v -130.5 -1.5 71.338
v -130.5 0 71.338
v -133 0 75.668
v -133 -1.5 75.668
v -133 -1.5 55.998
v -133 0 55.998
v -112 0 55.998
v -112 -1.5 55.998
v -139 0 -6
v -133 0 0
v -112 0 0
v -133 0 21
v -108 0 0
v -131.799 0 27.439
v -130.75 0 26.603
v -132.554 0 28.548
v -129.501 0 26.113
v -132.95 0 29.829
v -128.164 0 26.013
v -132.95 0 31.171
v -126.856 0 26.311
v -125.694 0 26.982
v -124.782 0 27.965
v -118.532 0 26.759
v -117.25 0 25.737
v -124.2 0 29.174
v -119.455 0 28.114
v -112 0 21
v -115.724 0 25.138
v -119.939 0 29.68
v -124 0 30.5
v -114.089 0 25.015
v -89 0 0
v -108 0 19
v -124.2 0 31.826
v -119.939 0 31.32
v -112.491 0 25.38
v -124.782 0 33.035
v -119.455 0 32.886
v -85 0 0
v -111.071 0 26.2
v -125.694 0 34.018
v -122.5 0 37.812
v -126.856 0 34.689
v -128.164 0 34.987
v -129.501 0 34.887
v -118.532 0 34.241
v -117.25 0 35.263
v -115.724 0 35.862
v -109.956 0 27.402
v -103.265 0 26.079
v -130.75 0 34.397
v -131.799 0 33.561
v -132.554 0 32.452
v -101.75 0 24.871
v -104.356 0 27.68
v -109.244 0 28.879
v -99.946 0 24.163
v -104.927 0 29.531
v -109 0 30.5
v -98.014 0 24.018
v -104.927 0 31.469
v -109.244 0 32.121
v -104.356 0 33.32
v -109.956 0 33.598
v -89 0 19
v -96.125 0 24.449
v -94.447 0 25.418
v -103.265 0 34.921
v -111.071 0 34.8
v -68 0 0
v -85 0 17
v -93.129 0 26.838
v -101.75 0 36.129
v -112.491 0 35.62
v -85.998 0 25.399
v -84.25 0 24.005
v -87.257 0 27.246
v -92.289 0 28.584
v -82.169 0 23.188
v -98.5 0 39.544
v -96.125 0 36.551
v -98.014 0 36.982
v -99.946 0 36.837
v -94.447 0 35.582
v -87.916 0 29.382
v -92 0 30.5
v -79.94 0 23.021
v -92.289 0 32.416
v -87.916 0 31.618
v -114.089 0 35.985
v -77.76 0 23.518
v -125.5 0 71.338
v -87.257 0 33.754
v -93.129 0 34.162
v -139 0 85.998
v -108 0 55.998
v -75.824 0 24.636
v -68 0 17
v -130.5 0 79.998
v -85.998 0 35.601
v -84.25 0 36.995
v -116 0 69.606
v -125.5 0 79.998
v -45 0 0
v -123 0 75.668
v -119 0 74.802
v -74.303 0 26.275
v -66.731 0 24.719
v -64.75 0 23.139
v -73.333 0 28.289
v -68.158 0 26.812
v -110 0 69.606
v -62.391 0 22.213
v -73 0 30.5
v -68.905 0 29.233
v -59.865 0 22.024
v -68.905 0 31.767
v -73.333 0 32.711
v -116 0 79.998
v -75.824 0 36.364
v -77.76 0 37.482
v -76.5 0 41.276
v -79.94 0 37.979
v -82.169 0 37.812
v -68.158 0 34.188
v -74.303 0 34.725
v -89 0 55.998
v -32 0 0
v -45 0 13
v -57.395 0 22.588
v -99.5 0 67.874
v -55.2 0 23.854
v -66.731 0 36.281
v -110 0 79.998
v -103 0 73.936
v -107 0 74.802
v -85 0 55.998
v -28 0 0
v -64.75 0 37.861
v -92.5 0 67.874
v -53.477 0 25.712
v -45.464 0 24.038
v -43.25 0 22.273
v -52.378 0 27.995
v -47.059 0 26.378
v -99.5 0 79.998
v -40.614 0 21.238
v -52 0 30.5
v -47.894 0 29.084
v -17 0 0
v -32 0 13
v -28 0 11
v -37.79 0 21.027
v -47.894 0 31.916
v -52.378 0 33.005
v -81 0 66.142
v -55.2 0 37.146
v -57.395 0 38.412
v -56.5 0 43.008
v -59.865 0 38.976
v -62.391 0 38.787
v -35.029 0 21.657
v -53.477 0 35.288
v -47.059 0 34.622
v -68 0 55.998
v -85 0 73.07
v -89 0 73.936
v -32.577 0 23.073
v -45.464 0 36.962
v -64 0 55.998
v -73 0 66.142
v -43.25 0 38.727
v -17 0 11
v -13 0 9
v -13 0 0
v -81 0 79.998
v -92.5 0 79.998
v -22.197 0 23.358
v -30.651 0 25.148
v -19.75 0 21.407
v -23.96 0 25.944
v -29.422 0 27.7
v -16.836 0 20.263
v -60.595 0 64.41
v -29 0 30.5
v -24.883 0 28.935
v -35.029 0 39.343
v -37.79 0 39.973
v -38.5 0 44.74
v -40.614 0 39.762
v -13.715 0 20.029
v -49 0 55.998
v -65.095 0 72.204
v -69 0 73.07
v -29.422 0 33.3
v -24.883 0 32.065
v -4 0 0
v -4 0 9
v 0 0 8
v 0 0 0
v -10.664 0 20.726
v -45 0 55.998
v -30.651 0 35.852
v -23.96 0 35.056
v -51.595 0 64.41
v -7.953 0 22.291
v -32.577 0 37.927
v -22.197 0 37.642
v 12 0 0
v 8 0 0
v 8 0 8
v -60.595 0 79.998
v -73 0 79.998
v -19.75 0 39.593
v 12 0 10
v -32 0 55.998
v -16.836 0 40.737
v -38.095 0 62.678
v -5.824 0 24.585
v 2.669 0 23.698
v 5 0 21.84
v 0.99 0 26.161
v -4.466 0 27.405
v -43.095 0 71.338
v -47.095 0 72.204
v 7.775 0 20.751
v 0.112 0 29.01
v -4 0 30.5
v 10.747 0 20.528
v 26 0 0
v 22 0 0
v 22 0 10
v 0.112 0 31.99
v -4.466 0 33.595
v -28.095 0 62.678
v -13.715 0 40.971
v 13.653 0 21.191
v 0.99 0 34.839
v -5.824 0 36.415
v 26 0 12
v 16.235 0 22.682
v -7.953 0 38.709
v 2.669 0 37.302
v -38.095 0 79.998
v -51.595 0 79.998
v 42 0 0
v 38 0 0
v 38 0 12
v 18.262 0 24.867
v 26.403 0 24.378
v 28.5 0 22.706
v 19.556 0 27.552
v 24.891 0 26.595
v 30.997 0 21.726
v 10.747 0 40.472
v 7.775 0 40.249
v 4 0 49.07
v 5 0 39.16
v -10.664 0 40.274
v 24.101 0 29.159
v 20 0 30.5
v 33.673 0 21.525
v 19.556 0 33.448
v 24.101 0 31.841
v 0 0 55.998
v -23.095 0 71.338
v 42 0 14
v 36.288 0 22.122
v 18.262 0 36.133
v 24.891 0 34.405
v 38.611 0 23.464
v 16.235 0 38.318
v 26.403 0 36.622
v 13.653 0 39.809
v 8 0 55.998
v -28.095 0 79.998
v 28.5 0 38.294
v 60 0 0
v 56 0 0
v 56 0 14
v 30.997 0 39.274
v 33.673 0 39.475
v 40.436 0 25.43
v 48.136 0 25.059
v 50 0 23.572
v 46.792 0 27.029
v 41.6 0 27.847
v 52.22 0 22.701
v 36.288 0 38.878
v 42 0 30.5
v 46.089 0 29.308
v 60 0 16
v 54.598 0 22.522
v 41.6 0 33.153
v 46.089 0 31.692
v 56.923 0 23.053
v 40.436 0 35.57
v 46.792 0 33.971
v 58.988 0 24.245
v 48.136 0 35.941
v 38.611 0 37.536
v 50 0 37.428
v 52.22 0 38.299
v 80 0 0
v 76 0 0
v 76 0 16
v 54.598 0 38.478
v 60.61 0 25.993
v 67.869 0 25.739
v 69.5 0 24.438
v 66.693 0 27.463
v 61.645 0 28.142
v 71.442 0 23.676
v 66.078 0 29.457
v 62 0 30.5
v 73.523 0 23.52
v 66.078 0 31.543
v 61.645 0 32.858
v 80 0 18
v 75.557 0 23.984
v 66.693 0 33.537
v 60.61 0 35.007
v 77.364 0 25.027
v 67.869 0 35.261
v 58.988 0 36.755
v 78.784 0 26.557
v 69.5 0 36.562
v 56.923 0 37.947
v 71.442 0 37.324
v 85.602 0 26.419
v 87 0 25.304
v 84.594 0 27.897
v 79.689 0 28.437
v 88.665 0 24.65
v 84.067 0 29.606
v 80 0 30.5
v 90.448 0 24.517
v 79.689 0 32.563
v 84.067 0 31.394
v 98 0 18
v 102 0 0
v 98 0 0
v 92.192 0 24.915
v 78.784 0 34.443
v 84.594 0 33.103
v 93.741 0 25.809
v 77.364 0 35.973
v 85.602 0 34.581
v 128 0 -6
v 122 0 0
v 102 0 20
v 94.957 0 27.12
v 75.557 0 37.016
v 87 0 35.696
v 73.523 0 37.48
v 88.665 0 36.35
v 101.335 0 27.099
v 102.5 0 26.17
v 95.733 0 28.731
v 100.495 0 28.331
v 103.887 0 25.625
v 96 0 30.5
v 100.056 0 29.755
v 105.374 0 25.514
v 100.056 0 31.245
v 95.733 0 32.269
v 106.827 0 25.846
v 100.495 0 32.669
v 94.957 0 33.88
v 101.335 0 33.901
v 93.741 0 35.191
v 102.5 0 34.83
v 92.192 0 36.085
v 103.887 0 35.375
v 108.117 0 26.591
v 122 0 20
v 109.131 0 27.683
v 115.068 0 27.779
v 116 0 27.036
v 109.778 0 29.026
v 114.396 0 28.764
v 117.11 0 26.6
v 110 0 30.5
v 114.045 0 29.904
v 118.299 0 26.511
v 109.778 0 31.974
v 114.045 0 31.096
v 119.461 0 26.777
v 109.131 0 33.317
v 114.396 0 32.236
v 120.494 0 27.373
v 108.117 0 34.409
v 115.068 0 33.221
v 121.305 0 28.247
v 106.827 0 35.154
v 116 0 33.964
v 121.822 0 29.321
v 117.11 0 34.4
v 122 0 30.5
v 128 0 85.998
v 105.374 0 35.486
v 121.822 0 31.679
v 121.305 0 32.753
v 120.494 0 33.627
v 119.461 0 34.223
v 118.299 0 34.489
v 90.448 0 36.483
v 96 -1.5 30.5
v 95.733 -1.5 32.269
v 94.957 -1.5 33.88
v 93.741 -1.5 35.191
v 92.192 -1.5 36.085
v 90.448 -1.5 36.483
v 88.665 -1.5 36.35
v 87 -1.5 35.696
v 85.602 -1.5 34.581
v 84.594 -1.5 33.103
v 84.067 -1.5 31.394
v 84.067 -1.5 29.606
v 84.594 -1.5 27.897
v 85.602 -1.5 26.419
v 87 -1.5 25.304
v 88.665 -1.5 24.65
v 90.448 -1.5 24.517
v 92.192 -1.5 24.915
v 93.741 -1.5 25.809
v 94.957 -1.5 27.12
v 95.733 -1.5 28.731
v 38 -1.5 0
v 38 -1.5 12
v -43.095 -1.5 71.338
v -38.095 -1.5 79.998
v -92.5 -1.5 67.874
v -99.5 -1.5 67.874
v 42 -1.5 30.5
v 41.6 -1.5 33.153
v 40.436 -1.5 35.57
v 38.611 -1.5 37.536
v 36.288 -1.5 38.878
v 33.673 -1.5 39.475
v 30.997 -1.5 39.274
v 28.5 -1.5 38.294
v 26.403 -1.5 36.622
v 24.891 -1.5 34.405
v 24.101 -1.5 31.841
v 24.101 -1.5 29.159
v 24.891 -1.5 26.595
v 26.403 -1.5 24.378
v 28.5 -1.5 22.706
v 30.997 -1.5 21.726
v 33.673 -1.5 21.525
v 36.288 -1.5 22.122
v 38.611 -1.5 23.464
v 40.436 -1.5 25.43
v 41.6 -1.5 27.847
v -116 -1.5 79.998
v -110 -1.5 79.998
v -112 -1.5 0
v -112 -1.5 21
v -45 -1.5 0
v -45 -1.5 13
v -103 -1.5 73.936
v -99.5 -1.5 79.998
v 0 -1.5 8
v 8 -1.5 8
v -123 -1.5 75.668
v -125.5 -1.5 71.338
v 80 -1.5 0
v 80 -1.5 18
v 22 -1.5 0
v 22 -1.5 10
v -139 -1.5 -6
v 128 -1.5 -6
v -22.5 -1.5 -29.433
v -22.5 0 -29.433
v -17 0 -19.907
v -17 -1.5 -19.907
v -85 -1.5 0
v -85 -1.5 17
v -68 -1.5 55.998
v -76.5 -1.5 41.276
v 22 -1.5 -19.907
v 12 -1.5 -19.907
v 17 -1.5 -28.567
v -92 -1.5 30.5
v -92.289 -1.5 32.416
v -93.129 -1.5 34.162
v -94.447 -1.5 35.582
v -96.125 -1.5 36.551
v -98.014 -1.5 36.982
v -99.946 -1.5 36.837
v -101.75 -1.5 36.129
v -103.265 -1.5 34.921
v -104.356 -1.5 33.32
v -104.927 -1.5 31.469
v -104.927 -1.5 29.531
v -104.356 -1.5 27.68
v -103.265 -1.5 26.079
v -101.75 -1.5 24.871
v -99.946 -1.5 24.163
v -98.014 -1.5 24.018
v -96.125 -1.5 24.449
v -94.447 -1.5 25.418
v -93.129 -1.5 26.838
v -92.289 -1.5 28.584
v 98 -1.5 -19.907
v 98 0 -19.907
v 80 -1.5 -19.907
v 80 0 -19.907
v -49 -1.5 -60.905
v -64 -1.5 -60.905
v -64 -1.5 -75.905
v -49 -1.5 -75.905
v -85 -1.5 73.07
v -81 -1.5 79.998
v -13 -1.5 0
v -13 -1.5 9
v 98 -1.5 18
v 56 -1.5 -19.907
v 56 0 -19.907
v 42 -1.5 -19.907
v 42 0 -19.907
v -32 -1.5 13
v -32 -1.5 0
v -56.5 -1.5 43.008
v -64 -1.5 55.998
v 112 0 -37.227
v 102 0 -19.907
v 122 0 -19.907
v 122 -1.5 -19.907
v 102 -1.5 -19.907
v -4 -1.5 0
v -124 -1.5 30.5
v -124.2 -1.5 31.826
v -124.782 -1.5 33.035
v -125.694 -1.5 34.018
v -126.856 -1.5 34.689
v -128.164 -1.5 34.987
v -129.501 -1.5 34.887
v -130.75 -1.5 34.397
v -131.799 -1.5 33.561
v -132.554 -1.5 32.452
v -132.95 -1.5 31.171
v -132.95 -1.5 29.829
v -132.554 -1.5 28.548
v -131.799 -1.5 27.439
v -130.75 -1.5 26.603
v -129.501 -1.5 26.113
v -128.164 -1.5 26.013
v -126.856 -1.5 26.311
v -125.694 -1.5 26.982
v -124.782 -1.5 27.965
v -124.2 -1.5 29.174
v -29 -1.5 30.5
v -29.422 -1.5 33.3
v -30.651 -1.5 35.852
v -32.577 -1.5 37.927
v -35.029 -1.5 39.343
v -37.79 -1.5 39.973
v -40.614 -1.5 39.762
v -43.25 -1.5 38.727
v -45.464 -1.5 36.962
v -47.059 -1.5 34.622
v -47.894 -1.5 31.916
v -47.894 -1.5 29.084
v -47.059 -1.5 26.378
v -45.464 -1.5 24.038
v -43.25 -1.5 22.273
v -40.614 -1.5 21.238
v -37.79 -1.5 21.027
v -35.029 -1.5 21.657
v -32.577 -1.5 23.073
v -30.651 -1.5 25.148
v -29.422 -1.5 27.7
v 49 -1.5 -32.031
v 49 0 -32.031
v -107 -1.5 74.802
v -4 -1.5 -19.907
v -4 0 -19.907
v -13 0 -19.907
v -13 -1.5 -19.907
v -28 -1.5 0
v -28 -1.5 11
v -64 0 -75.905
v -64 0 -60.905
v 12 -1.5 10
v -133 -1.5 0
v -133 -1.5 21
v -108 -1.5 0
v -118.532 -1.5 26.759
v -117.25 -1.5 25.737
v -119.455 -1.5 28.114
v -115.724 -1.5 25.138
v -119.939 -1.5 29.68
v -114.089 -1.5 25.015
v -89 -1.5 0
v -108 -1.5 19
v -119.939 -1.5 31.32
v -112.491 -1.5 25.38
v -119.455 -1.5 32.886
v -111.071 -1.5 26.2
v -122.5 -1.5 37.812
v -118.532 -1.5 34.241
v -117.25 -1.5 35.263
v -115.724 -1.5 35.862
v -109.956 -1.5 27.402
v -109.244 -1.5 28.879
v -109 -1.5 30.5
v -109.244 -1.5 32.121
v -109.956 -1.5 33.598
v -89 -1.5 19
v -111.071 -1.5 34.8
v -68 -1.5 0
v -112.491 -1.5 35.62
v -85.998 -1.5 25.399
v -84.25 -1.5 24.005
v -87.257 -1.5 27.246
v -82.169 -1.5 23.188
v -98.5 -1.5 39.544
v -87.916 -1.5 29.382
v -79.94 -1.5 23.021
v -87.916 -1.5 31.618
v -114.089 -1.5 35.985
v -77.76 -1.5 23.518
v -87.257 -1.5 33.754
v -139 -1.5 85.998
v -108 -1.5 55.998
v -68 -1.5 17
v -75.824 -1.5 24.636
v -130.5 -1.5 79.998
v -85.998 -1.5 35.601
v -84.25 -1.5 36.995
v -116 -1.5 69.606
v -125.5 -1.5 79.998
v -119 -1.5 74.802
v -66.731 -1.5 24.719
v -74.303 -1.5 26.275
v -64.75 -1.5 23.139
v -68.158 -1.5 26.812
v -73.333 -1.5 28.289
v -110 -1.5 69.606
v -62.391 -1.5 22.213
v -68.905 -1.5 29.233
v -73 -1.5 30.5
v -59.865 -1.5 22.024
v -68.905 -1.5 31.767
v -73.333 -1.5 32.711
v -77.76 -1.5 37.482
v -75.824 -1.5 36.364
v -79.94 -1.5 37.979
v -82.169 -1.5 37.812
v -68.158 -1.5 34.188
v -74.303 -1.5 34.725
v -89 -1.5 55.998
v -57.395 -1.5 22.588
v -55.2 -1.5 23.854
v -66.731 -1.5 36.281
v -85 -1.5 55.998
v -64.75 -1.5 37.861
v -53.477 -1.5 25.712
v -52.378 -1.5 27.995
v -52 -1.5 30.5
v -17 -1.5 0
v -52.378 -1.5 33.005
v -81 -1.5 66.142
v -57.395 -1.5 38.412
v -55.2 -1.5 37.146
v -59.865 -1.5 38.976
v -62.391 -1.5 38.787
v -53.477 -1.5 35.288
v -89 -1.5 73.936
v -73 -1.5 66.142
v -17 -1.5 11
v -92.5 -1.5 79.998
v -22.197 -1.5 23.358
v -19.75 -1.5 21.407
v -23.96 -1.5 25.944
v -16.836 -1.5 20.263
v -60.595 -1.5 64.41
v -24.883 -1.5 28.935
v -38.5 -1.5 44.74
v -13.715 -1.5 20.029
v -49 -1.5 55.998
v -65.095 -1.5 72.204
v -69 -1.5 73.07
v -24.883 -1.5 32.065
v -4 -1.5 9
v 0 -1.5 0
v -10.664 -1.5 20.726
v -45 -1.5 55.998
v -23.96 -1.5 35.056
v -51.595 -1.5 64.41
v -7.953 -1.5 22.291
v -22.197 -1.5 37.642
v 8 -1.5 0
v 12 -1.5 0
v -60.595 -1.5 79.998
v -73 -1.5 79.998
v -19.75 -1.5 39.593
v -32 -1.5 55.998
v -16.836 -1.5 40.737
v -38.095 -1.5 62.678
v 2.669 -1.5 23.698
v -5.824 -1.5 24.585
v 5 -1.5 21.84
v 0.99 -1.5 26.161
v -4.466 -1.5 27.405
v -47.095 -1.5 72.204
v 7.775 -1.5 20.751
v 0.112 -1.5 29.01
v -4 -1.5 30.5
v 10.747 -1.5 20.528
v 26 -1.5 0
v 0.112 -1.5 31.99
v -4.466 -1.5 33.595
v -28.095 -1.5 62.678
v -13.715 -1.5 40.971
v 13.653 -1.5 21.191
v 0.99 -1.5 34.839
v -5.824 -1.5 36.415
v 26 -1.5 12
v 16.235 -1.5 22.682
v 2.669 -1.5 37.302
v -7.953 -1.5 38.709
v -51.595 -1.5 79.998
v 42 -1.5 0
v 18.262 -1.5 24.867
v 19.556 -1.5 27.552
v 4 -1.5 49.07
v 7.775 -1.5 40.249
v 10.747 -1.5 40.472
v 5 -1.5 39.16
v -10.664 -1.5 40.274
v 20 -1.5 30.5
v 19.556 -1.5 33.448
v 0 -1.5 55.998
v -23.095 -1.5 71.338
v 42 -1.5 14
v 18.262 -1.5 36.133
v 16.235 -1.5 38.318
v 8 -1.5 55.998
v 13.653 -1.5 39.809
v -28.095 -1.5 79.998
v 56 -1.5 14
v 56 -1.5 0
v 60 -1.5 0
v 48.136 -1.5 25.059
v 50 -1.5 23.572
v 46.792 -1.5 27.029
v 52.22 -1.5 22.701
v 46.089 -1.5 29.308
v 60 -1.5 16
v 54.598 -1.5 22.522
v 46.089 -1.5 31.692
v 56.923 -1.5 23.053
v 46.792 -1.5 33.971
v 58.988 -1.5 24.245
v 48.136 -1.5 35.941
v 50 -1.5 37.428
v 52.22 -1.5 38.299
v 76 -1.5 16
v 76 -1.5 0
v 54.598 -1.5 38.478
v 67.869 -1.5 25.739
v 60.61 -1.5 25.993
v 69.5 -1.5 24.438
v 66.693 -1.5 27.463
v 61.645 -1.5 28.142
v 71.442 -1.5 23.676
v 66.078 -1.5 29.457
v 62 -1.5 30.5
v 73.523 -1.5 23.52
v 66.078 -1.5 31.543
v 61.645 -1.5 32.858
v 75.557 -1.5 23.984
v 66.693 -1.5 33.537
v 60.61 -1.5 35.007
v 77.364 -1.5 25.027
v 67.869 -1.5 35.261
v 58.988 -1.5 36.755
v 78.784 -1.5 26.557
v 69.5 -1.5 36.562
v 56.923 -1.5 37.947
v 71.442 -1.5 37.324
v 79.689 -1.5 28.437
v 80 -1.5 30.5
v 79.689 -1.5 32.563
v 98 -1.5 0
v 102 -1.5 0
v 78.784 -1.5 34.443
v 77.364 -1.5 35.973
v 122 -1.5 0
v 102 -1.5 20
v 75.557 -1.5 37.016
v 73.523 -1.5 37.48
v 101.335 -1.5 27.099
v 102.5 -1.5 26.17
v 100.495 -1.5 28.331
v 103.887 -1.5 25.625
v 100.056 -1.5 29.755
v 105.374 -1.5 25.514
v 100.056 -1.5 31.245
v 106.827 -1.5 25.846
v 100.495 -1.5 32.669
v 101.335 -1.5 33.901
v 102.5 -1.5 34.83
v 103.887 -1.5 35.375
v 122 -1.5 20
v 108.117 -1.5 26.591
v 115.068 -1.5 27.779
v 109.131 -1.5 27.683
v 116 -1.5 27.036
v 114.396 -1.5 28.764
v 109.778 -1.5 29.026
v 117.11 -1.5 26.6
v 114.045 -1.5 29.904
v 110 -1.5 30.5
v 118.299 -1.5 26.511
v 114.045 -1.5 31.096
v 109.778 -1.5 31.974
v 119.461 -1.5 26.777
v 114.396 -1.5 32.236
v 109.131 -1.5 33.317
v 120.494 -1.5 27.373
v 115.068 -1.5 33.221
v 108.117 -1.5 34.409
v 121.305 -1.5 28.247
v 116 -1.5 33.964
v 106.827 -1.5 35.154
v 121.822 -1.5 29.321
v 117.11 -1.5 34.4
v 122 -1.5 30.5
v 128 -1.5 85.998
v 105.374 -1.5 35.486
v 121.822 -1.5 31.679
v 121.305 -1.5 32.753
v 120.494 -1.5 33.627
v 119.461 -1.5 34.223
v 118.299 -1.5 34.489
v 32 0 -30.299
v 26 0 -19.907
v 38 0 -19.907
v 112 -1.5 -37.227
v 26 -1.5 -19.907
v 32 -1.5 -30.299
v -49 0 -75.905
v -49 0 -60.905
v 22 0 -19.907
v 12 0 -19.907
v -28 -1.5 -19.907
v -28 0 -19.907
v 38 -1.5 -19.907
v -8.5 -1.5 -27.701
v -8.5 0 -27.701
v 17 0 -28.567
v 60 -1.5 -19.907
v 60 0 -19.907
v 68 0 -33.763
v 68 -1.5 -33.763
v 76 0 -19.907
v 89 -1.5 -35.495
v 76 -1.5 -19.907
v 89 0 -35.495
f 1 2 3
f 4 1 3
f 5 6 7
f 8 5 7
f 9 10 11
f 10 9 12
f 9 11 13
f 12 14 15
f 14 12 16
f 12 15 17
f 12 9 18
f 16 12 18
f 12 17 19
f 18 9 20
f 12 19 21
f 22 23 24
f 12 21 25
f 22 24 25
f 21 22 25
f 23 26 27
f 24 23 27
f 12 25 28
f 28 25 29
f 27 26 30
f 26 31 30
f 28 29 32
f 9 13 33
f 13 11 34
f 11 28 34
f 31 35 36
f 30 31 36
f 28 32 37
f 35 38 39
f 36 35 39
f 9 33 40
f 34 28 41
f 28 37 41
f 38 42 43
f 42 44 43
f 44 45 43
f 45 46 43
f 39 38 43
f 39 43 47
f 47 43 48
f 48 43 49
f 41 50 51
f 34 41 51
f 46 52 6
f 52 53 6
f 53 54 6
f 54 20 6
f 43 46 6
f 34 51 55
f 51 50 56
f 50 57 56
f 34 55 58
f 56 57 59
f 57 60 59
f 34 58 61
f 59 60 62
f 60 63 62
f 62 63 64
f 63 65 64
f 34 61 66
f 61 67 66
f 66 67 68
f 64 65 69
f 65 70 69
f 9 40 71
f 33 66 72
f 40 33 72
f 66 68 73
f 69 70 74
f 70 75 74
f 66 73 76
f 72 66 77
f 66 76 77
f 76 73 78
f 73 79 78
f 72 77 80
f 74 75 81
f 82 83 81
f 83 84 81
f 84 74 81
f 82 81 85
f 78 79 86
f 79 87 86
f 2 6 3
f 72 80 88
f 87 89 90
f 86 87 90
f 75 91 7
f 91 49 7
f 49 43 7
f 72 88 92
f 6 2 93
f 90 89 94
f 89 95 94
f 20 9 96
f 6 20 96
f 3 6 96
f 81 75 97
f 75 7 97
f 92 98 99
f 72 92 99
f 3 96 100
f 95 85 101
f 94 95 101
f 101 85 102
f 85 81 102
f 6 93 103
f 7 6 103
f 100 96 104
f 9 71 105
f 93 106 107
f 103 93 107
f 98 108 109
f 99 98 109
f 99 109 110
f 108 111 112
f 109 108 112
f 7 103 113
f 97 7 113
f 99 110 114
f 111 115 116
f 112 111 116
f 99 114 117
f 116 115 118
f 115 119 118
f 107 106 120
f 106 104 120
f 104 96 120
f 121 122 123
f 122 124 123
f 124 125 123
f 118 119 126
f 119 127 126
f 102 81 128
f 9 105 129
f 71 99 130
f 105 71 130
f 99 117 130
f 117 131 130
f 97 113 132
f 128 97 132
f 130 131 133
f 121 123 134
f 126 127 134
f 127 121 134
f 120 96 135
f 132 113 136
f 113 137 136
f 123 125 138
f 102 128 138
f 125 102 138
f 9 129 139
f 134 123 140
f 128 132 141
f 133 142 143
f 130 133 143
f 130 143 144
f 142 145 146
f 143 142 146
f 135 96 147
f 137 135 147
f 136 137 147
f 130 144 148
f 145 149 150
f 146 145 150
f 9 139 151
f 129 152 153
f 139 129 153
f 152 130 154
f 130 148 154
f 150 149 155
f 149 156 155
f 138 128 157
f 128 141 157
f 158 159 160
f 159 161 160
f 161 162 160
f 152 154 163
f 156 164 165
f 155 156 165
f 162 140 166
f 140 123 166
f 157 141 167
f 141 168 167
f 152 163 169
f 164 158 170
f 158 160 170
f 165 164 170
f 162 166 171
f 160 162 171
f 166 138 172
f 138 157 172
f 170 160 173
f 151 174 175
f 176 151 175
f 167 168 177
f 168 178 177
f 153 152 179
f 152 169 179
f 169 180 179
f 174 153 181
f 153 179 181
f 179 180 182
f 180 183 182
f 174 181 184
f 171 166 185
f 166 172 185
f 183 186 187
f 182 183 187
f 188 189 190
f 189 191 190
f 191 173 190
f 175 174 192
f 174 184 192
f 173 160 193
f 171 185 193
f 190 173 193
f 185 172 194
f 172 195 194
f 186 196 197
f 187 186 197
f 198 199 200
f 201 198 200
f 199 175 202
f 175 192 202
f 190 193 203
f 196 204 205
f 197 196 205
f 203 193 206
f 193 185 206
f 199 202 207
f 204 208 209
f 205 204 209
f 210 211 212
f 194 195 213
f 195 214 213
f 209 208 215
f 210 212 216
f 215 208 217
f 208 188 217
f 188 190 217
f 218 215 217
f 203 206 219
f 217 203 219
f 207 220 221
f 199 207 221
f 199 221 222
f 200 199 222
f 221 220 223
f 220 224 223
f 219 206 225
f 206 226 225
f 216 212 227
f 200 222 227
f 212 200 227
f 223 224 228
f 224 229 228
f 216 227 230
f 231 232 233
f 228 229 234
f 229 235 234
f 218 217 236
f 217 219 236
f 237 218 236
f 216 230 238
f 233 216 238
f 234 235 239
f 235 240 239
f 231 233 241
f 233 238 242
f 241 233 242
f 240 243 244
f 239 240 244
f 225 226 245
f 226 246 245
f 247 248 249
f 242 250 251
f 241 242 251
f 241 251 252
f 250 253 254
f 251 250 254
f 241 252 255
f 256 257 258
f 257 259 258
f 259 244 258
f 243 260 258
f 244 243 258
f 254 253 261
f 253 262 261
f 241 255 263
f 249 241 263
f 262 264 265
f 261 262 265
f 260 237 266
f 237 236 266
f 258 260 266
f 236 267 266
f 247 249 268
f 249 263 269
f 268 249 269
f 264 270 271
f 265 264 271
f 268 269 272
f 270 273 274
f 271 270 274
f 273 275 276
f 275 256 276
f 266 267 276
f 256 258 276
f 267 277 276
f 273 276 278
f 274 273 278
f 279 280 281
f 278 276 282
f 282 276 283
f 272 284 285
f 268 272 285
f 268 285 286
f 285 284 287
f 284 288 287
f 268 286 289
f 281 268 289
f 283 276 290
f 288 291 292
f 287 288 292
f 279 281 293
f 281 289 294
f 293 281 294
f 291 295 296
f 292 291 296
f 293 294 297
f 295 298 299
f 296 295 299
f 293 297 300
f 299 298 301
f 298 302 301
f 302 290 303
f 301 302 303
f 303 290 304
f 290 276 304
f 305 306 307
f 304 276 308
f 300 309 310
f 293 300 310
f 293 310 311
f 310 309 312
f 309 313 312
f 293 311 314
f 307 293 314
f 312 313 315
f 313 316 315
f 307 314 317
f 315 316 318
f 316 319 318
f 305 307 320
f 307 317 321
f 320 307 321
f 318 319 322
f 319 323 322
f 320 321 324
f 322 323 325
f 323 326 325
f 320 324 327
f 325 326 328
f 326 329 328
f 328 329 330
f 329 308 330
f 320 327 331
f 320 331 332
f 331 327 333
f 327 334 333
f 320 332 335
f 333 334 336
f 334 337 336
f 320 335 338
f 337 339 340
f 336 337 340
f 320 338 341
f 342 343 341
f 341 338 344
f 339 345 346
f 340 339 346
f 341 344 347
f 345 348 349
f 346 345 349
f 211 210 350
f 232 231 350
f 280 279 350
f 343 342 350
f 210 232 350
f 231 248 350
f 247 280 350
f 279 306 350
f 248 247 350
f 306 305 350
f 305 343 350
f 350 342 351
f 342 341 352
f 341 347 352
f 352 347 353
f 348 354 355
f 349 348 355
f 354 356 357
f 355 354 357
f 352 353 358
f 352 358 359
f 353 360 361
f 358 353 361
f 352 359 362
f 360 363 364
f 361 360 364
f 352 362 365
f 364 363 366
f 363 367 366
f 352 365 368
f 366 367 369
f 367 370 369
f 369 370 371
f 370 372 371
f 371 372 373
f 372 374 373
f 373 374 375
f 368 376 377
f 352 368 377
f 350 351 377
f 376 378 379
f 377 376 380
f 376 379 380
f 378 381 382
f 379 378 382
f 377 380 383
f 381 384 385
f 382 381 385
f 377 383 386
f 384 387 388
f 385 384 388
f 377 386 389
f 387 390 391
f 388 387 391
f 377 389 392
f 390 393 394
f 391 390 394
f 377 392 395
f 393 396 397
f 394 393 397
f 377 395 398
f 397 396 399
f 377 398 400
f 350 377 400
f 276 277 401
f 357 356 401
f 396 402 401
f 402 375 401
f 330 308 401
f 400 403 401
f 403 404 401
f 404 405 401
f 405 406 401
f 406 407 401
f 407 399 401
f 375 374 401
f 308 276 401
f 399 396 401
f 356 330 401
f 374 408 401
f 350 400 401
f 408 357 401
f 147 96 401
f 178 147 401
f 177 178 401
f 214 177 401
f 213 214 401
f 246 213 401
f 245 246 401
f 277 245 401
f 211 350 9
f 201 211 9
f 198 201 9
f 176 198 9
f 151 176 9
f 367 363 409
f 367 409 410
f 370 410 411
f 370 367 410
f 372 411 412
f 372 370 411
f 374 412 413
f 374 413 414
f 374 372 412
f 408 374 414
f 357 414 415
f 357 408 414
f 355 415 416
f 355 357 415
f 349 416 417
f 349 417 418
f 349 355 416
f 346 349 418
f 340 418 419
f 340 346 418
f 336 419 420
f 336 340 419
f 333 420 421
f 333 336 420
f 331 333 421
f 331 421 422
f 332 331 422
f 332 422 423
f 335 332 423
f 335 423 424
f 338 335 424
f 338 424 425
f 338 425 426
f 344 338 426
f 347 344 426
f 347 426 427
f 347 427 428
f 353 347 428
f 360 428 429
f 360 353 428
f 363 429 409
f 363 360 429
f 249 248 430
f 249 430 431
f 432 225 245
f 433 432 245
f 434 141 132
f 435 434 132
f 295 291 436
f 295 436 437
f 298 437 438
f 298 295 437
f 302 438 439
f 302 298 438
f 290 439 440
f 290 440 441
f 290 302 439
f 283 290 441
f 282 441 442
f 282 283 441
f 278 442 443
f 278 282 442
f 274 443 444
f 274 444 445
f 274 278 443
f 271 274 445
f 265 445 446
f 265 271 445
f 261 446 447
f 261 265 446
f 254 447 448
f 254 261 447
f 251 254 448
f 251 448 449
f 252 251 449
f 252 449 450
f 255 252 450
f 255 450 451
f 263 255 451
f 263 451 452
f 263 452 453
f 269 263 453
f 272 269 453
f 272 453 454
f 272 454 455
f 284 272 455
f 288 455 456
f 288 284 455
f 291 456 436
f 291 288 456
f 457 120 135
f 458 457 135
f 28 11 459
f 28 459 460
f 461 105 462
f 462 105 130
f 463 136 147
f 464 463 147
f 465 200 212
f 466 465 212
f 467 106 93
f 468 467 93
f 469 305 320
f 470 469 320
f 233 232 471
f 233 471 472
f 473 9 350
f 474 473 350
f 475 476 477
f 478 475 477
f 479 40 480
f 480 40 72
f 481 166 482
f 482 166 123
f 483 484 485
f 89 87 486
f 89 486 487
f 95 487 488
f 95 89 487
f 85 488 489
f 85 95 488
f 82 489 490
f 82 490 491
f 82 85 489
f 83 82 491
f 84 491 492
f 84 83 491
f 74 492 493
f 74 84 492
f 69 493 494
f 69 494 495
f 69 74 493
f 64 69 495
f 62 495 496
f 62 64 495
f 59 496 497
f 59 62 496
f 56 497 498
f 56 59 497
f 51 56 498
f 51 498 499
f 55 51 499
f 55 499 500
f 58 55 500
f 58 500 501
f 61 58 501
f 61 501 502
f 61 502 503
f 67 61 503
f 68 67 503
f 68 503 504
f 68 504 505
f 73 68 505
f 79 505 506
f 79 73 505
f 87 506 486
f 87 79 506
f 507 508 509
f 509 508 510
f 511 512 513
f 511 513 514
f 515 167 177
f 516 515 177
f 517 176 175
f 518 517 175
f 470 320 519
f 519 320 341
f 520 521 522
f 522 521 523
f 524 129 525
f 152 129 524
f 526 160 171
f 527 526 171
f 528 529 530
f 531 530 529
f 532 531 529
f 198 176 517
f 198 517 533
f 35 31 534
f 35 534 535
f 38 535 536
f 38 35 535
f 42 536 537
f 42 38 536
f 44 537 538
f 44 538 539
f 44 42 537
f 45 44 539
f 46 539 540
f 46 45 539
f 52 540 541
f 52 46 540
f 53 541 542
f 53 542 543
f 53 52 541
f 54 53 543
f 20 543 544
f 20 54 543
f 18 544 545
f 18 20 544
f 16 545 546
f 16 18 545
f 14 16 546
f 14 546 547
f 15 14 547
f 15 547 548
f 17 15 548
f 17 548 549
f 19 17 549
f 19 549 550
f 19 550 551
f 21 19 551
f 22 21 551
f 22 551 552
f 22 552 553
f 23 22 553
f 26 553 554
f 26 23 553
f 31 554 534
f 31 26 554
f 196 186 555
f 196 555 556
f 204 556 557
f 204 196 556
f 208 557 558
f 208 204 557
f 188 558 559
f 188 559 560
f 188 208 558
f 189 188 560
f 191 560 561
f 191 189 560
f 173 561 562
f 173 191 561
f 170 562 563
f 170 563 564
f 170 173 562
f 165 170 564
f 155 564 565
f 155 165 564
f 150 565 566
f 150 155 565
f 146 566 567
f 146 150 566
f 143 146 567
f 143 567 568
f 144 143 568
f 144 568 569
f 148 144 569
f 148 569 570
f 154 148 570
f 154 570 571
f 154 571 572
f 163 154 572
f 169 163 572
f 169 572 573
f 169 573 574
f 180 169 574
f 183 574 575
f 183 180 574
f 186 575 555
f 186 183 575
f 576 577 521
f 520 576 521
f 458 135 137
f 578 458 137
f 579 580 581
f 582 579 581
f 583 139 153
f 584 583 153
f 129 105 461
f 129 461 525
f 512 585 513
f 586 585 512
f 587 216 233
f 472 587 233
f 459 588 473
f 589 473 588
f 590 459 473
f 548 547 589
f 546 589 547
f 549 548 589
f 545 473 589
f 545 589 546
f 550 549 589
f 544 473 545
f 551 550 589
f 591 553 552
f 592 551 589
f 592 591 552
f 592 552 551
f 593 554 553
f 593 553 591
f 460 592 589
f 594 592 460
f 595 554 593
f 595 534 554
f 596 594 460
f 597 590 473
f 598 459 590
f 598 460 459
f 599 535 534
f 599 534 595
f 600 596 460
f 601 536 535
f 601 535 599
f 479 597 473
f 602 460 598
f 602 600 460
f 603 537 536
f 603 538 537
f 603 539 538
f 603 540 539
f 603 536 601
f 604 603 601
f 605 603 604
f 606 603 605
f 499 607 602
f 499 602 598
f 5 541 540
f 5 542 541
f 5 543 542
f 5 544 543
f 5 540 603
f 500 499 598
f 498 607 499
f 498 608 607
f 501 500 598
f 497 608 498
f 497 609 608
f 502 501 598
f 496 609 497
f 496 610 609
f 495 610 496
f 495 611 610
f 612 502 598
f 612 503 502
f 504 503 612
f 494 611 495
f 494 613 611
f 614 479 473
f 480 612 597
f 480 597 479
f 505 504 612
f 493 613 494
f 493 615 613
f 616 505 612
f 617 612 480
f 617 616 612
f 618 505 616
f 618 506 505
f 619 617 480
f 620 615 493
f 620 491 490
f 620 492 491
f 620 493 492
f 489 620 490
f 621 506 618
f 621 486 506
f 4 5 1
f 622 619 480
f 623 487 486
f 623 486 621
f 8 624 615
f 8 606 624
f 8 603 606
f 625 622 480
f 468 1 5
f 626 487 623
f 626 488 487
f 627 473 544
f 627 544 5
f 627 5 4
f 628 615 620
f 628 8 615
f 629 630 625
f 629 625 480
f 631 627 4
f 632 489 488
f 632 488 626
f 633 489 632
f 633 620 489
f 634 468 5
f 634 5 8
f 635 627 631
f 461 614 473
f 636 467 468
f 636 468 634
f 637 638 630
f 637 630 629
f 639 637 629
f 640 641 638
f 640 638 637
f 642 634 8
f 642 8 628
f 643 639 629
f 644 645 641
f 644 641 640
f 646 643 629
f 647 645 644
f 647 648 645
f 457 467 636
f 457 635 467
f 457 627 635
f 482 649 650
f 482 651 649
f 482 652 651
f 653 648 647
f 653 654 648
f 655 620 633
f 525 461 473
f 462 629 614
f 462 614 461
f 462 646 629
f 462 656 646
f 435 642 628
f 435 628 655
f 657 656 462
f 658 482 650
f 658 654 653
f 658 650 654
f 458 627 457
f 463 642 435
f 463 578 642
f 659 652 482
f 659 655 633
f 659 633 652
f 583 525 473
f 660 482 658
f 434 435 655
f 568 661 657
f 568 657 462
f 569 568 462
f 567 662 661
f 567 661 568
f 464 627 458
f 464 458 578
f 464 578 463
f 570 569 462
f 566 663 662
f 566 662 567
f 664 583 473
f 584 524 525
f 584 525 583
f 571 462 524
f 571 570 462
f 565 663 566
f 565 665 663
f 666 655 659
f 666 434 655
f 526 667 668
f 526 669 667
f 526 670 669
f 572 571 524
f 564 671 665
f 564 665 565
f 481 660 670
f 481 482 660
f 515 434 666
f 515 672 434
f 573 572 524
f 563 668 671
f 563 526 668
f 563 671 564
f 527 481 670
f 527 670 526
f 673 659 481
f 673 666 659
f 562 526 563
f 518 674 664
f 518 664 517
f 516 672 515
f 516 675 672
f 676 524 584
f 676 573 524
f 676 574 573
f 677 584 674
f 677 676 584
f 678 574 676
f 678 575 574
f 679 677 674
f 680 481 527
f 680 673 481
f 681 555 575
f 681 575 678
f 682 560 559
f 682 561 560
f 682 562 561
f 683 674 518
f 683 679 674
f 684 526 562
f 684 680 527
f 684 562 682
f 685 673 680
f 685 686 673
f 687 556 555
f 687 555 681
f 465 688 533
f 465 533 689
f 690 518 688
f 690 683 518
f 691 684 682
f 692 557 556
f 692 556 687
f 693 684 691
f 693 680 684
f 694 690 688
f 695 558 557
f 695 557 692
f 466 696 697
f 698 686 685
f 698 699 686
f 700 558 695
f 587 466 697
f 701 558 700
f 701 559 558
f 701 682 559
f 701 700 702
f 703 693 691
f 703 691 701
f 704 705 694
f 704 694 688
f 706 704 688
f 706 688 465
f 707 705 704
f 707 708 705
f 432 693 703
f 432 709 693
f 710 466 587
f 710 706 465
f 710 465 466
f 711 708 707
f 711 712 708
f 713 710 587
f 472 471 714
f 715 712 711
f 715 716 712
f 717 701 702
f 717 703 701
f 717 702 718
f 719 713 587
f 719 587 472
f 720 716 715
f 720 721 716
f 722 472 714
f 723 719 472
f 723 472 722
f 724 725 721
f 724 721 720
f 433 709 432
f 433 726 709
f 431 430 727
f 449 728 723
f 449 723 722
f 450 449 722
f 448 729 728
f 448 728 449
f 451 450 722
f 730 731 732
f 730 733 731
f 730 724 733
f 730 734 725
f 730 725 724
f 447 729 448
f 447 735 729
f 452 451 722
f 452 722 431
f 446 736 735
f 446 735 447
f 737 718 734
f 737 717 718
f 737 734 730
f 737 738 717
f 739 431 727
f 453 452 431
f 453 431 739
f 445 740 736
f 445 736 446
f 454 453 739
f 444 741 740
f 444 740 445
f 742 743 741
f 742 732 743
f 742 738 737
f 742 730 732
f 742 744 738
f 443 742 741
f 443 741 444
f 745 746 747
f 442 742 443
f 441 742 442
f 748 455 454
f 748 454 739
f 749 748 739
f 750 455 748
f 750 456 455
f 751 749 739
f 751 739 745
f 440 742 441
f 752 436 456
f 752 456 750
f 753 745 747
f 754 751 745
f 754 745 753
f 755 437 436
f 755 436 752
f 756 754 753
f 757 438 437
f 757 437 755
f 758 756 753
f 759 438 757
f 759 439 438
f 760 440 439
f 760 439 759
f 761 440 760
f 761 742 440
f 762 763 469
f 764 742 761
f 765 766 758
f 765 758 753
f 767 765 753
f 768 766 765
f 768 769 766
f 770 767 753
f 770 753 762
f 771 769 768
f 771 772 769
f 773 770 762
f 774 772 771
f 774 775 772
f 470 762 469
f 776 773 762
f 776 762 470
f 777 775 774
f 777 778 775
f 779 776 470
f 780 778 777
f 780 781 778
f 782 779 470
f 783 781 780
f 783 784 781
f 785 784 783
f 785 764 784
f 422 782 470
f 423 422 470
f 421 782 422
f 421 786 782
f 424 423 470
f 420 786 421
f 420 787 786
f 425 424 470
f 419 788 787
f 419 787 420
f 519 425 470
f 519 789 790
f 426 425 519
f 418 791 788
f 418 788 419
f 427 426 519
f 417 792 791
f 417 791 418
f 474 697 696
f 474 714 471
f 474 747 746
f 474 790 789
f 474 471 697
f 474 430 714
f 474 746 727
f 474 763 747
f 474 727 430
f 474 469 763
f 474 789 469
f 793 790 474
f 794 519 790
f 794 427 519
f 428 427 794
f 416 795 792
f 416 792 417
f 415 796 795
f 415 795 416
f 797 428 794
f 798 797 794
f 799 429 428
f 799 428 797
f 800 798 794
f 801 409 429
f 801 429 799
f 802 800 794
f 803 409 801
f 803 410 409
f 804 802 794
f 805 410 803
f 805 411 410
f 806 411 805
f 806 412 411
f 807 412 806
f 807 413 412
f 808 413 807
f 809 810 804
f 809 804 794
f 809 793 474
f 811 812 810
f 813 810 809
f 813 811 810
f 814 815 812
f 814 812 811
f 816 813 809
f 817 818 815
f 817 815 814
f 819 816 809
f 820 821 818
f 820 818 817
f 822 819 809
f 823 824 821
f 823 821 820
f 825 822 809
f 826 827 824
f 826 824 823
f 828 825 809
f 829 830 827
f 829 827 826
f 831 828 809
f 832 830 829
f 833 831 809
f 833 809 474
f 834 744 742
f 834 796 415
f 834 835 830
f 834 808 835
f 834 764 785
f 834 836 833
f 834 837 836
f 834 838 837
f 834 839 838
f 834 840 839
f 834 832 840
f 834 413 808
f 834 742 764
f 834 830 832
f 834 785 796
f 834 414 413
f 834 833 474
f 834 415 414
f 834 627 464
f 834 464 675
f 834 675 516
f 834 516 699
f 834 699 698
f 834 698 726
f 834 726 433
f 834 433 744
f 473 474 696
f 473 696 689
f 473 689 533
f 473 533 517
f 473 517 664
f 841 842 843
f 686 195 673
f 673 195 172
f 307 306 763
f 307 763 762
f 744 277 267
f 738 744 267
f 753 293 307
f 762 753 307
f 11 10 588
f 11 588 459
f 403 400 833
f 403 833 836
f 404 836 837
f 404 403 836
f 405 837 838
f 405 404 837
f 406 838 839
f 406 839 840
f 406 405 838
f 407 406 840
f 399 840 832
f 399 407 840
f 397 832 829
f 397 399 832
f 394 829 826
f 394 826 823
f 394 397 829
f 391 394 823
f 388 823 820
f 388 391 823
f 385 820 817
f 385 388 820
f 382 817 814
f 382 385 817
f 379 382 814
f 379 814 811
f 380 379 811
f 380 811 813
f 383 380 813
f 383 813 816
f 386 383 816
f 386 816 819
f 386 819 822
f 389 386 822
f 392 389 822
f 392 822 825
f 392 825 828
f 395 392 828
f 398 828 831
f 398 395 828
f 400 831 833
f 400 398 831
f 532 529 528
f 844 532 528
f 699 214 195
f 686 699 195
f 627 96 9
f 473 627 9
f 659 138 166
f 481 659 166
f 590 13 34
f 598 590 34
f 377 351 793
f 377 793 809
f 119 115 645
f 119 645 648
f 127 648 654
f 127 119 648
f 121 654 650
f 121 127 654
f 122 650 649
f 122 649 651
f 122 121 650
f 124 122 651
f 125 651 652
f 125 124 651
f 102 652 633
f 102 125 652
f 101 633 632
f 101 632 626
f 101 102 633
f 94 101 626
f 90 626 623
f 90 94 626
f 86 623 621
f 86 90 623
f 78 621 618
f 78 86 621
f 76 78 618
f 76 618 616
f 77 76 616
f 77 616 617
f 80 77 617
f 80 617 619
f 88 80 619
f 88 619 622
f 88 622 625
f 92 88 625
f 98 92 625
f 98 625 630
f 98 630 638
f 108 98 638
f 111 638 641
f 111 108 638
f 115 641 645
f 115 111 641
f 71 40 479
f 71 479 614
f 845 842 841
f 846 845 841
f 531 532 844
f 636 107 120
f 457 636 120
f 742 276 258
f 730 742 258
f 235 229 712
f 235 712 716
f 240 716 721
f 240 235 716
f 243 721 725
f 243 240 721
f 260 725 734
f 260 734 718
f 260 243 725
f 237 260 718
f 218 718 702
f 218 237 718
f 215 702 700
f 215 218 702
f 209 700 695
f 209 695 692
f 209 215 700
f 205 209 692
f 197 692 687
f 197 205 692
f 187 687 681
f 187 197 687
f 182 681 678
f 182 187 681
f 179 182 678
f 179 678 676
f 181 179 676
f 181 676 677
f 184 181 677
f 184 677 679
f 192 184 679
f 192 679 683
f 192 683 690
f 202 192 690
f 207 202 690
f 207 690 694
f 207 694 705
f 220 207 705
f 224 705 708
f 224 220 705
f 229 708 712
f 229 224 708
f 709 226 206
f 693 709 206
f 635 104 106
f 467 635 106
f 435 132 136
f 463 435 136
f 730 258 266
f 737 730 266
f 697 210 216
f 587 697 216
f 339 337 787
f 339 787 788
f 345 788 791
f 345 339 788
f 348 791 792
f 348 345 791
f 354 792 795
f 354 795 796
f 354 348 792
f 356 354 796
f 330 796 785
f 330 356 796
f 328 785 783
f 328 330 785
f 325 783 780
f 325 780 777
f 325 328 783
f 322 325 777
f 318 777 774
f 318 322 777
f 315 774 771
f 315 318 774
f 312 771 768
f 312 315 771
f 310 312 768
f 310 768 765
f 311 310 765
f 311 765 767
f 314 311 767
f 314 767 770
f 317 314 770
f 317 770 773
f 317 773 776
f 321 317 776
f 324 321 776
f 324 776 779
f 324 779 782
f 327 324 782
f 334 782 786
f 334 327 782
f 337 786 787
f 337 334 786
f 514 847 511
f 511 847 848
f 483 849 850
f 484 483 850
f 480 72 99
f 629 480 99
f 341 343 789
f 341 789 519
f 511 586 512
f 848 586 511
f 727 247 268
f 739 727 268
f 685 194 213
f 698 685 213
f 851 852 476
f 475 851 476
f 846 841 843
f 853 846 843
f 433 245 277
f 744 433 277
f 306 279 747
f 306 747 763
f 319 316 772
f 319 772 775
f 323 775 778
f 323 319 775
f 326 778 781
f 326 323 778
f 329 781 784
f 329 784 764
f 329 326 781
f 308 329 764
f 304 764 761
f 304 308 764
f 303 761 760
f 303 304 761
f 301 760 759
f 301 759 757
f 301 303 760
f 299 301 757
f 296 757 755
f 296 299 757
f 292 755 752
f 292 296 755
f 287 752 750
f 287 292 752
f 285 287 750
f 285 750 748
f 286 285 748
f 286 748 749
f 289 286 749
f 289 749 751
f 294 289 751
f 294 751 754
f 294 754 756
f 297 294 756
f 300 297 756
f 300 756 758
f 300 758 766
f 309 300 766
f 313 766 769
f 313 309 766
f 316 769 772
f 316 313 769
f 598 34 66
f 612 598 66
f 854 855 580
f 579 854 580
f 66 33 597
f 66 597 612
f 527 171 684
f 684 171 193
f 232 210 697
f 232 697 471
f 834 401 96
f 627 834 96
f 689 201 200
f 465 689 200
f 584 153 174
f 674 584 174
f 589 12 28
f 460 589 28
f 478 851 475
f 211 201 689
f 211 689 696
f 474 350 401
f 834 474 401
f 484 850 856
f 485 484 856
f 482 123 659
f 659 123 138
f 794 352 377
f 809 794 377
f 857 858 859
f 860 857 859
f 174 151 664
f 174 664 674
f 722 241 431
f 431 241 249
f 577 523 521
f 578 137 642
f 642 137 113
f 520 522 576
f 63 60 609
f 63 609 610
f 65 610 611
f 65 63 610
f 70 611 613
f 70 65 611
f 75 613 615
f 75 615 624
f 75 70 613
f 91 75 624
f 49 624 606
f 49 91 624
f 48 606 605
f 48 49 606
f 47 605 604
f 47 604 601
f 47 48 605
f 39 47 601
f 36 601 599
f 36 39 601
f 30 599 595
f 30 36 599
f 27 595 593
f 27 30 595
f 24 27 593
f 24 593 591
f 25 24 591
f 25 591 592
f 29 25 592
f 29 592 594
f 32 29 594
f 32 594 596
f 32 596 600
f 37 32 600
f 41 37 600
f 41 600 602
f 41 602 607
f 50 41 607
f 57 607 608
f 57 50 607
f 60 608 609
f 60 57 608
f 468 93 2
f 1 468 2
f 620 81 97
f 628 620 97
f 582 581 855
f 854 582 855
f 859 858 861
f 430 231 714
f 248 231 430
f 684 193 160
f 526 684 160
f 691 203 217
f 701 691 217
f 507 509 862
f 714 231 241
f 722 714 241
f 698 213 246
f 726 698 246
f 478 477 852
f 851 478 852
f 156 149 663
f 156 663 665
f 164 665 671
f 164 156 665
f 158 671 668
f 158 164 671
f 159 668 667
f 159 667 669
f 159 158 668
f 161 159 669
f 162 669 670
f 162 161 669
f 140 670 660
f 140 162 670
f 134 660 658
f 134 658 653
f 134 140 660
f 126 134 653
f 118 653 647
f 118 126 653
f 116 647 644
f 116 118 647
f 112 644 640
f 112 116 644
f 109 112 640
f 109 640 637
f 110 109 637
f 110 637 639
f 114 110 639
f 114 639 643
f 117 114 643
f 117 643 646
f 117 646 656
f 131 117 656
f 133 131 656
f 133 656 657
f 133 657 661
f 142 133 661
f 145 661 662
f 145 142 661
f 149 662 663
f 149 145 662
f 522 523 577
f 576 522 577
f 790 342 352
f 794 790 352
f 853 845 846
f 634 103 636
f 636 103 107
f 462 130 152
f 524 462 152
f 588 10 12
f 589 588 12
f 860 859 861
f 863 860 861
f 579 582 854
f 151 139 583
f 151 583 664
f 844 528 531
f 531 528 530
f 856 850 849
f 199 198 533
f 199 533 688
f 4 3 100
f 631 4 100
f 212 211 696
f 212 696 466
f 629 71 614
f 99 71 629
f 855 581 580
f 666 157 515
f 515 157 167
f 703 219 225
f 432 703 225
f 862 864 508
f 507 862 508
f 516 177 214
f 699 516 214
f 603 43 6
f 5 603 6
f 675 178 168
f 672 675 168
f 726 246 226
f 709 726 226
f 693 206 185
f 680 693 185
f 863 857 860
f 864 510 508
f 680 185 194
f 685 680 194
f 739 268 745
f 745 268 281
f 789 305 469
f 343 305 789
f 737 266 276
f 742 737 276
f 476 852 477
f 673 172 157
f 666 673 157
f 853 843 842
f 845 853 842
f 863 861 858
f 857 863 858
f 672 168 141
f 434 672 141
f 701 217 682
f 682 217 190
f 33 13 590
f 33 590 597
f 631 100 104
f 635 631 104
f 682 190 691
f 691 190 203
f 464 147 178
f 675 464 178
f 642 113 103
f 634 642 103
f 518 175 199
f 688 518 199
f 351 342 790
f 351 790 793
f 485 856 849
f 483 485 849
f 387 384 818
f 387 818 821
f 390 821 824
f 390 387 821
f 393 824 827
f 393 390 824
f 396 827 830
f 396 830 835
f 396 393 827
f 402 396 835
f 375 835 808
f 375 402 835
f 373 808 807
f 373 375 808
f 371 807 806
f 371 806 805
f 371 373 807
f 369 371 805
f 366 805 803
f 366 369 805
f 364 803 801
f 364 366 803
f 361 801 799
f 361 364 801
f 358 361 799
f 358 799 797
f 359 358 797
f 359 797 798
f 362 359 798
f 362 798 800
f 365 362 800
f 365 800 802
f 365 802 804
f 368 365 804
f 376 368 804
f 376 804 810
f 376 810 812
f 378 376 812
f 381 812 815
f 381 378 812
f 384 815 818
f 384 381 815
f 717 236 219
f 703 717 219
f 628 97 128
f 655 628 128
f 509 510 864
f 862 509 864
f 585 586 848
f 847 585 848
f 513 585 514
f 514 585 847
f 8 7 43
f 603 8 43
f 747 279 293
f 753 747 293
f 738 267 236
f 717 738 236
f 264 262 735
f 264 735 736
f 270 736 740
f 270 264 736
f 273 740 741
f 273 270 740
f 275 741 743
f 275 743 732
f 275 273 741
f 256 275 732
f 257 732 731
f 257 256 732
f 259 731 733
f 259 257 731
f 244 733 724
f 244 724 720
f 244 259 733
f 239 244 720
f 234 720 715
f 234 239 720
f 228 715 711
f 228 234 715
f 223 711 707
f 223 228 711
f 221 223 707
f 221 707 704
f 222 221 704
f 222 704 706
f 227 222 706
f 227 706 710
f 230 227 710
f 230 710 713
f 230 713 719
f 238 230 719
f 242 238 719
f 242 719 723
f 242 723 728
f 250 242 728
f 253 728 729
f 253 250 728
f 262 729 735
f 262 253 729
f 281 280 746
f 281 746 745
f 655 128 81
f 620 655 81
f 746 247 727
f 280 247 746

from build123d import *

# Parameters (mm, degrees)
F0_W     = 15
F0_H     = 15
F0_W_2   = 9
F0_H_2   = 9
F0_W_3   = 8
F0_H_3   = 8
F0_W_4   = 10
F0_H_4   = 10
F0_W_5   = 21
F0_H_5   = 21
F0_W_6   = 19
F0_H_6   = 19
F0_W_7   = 17
F0_H_7   = 17
F0_R     = 4.5
F0_R_2   = 5.5
F0_R_3   = 6.5
F0_R_4   = 7.5
F0_W_8   = 13
F0_H_8   = 13
F0_W_9   = 11
F0_H_9   = 11
F0_R_5   = 8.5
F0_R_6   = 9.5
F0_R_7   = 10.5
F0_W_10  = 12
F0_H_10  = 12
F0_W_11  = 14
F0_H_11  = 14
F0_R_8   = 10
F0_R_9   = 9
F0_R_10  = 8
F0_W_12  = 16
F0_H_12  = 16
F0_W_13  = 18
F0_H_13  = 18
F0_W_14  = 20
F0_H_14  = 20
F0_R_11  = 7
F0_R_12  = 6
F0_R_13  = 5
F0_R_14  = 4
F1_DEPTH = 1.5


with BuildPart() as f1:
    # F0 (on Front) → F1 (new body)
    with BuildSketch(Plane.XZ):
        with Locations((-56.5, -68.404836)):
            Rectangle(F0_W, F0_H)
        Polygon((22, -19.906721), (12, -19.906721), (17, -28.566975), align=None)
        Polygon((38, -19.906721), (26, -19.906721), (32, -30.299026), align=None)
        Polygon((56, -19.906721), (42, -19.906721), (49, -32.031077), align=None)
        Polygon((76, -19.906721), (60, -19.906721), (68, -33.763127), align=None)
        Polygon((98, -19.906721), (80, -19.906721), (89, -35.495178), align=None)
        Polygon((122, -19.906721), (102, -19.906721), (112, -37.227229), align=None)
        Polygon((-4, -19.906721), (-13, -19.906721), (-8.5, -27.70095), align=None)
        Polygon((-17, -19.906721), (-28, -19.906721), (-22.5, -29.433), align=None)
        Polygon((128, 85.998115), (-139, 85.998115), (-139, 79.998115), (-139, -6), (128, -6), align=None)
        with Locations((-8.5, 4.5)):
            Rectangle(F0_W_2, F0_H_2, mode=Mode.SUBTRACT)
        with Locations((4, 4)):
            Rectangle(F0_W_3, F0_H_3, mode=Mode.SUBTRACT)
        with Locations((17, 5)):
            Rectangle(F0_W_4, F0_H_4, mode=Mode.SUBTRACT)
        with Locations((-122.5, 10.5)):
            Rectangle(F0_W_5, F0_H_5, mode=Mode.SUBTRACT)
        with Locations((-98.5, 9.5)):
            Rectangle(F0_W_6, F0_H_6, mode=Mode.SUBTRACT)
        with Locations((-76.5, 8.5)):
            Rectangle(F0_W_7, F0_H_7, mode=Mode.SUBTRACT)
        with Locations((-128.5, 30.5)):
            Circle(F0_R, mode=Mode.SUBTRACT)
        with Locations((-114.5, 30.5)):
            Circle(F0_R_2, mode=Mode.SUBTRACT)
        with Locations((-98.5, 30.5)):
            Circle(F0_R_3, mode=Mode.SUBTRACT)
        with Locations((-80.5, 30.5)):
            Circle(F0_R_4, mode=Mode.SUBTRACT)
        with Locations((-38.5, 6.5)):
            Rectangle(F0_W_8, F0_H_8, mode=Mode.SUBTRACT)
        with Locations((-22.5, 5.5)):
            Rectangle(F0_W_9, F0_H_9, mode=Mode.SUBTRACT)
        with Locations((-60.5, 30.5)):
            Circle(F0_R_5, mode=Mode.SUBTRACT)
        with Locations((-38.5, 30.5)):
            Circle(F0_R_6, mode=Mode.SUBTRACT)
        with Locations((-14.5, 30.5)):
            Circle(F0_R_7, mode=Mode.SUBTRACT)
        Polygon((-122.5, 37.811581), (-133, 55.998115), (-112, 55.998115), align=None, mode=Mode.SUBTRACT)
        Polygon((-98.5, 39.543632), (-108, 55.998115), (-89, 55.998115), align=None, mode=Mode.SUBTRACT)
        Polygon((-76.5, 41.275683), (-85, 55.998115), (-68, 55.998115), align=None, mode=Mode.SUBTRACT)
        Polygon((-133, 75.667987), (-130.5, 79.998115), (-125.5, 79.998115), (-123, 75.667987), (-125.5, 71.33786), (-130.5, 71.33786), align=None, mode=Mode.SUBTRACT)
        Polygon((-119, 74.801962), (-116, 79.998115), (-110, 79.998115), (-107, 74.801962), (-110, 69.60581), (-116, 69.60581), align=None, mode=Mode.SUBTRACT)
        Polygon((-103, 73.935937), (-99.5, 79.998115), (-92.5, 79.998115), (-89, 73.935937), (-92.5, 67.873759), (-99.5, 67.873759), align=None, mode=Mode.SUBTRACT)
        Polygon((-85, 73.069911), (-81, 79.998115), (-73, 79.998115), (-69, 73.069911), (-73, 66.141708), (-81, 66.141708), align=None, mode=Mode.SUBTRACT)
        Polygon((-56.5, 43.007733), (-64, 55.998115), (-49, 55.998115), align=None, mode=Mode.SUBTRACT)
        Polygon((-38.5, 44.739784), (-45, 55.998115), (-32, 55.998115), align=None, mode=Mode.SUBTRACT)
        Polygon((-65.094875, 72.203886), (-60.594875, 79.998115), (-51.594875, 79.998115), (-47.094875, 72.203886), (-51.594875, 64.409657), (-60.594875, 64.409657), align=None, mode=Mode.SUBTRACT)
        Polygon((-43.094875, 71.33786), (-38.094875, 79.998115), (-28.094875, 79.998115), (-23.094875, 71.33786), (-28.094875, 62.677606), (-38.094875, 62.677606), align=None, mode=Mode.SUBTRACT)
        with Locations((32, 6)):
            Rectangle(F0_W_10, F0_H_10, mode=Mode.SUBTRACT)
        with Locations((49, 7)):
            Rectangle(F0_W_11, F0_H_11, mode=Mode.SUBTRACT)
        with Locations((10, 30.5)):
            Circle(F0_R_8, mode=Mode.SUBTRACT)
        with Locations((33, 30.5)):
            Circle(F0_R_9, mode=Mode.SUBTRACT)
        with Locations((54, 30.5)):
            Circle(F0_R_10, mode=Mode.SUBTRACT)
        with Locations((68, 8)):
            Rectangle(F0_W_12, F0_H_12, mode=Mode.SUBTRACT)
        with Locations((89, 9)):
            Rectangle(F0_W_13, F0_H_13, mode=Mode.SUBTRACT)
        with Locations((112, 10)):
            Rectangle(F0_W_14, F0_H_14, mode=Mode.SUBTRACT)
        with Locations((73, 30.5)):
            Circle(F0_R_11, mode=Mode.SUBTRACT)
        with Locations((90, 30.5)):
            Circle(F0_R_12, mode=Mode.SUBTRACT)
        with Locations((105, 30.5)):
            Circle(F0_R_13, mode=Mode.SUBTRACT)
        with Locations((118, 30.5)):
            Circle(F0_R_14, mode=Mode.SUBTRACT)
        Polygon((4, 49.069911), (0, 55.998115), (8, 55.998115), align=None, mode=Mode.SUBTRACT)
    extrude(amount=F1_DEPTH)


solid = f1.part
